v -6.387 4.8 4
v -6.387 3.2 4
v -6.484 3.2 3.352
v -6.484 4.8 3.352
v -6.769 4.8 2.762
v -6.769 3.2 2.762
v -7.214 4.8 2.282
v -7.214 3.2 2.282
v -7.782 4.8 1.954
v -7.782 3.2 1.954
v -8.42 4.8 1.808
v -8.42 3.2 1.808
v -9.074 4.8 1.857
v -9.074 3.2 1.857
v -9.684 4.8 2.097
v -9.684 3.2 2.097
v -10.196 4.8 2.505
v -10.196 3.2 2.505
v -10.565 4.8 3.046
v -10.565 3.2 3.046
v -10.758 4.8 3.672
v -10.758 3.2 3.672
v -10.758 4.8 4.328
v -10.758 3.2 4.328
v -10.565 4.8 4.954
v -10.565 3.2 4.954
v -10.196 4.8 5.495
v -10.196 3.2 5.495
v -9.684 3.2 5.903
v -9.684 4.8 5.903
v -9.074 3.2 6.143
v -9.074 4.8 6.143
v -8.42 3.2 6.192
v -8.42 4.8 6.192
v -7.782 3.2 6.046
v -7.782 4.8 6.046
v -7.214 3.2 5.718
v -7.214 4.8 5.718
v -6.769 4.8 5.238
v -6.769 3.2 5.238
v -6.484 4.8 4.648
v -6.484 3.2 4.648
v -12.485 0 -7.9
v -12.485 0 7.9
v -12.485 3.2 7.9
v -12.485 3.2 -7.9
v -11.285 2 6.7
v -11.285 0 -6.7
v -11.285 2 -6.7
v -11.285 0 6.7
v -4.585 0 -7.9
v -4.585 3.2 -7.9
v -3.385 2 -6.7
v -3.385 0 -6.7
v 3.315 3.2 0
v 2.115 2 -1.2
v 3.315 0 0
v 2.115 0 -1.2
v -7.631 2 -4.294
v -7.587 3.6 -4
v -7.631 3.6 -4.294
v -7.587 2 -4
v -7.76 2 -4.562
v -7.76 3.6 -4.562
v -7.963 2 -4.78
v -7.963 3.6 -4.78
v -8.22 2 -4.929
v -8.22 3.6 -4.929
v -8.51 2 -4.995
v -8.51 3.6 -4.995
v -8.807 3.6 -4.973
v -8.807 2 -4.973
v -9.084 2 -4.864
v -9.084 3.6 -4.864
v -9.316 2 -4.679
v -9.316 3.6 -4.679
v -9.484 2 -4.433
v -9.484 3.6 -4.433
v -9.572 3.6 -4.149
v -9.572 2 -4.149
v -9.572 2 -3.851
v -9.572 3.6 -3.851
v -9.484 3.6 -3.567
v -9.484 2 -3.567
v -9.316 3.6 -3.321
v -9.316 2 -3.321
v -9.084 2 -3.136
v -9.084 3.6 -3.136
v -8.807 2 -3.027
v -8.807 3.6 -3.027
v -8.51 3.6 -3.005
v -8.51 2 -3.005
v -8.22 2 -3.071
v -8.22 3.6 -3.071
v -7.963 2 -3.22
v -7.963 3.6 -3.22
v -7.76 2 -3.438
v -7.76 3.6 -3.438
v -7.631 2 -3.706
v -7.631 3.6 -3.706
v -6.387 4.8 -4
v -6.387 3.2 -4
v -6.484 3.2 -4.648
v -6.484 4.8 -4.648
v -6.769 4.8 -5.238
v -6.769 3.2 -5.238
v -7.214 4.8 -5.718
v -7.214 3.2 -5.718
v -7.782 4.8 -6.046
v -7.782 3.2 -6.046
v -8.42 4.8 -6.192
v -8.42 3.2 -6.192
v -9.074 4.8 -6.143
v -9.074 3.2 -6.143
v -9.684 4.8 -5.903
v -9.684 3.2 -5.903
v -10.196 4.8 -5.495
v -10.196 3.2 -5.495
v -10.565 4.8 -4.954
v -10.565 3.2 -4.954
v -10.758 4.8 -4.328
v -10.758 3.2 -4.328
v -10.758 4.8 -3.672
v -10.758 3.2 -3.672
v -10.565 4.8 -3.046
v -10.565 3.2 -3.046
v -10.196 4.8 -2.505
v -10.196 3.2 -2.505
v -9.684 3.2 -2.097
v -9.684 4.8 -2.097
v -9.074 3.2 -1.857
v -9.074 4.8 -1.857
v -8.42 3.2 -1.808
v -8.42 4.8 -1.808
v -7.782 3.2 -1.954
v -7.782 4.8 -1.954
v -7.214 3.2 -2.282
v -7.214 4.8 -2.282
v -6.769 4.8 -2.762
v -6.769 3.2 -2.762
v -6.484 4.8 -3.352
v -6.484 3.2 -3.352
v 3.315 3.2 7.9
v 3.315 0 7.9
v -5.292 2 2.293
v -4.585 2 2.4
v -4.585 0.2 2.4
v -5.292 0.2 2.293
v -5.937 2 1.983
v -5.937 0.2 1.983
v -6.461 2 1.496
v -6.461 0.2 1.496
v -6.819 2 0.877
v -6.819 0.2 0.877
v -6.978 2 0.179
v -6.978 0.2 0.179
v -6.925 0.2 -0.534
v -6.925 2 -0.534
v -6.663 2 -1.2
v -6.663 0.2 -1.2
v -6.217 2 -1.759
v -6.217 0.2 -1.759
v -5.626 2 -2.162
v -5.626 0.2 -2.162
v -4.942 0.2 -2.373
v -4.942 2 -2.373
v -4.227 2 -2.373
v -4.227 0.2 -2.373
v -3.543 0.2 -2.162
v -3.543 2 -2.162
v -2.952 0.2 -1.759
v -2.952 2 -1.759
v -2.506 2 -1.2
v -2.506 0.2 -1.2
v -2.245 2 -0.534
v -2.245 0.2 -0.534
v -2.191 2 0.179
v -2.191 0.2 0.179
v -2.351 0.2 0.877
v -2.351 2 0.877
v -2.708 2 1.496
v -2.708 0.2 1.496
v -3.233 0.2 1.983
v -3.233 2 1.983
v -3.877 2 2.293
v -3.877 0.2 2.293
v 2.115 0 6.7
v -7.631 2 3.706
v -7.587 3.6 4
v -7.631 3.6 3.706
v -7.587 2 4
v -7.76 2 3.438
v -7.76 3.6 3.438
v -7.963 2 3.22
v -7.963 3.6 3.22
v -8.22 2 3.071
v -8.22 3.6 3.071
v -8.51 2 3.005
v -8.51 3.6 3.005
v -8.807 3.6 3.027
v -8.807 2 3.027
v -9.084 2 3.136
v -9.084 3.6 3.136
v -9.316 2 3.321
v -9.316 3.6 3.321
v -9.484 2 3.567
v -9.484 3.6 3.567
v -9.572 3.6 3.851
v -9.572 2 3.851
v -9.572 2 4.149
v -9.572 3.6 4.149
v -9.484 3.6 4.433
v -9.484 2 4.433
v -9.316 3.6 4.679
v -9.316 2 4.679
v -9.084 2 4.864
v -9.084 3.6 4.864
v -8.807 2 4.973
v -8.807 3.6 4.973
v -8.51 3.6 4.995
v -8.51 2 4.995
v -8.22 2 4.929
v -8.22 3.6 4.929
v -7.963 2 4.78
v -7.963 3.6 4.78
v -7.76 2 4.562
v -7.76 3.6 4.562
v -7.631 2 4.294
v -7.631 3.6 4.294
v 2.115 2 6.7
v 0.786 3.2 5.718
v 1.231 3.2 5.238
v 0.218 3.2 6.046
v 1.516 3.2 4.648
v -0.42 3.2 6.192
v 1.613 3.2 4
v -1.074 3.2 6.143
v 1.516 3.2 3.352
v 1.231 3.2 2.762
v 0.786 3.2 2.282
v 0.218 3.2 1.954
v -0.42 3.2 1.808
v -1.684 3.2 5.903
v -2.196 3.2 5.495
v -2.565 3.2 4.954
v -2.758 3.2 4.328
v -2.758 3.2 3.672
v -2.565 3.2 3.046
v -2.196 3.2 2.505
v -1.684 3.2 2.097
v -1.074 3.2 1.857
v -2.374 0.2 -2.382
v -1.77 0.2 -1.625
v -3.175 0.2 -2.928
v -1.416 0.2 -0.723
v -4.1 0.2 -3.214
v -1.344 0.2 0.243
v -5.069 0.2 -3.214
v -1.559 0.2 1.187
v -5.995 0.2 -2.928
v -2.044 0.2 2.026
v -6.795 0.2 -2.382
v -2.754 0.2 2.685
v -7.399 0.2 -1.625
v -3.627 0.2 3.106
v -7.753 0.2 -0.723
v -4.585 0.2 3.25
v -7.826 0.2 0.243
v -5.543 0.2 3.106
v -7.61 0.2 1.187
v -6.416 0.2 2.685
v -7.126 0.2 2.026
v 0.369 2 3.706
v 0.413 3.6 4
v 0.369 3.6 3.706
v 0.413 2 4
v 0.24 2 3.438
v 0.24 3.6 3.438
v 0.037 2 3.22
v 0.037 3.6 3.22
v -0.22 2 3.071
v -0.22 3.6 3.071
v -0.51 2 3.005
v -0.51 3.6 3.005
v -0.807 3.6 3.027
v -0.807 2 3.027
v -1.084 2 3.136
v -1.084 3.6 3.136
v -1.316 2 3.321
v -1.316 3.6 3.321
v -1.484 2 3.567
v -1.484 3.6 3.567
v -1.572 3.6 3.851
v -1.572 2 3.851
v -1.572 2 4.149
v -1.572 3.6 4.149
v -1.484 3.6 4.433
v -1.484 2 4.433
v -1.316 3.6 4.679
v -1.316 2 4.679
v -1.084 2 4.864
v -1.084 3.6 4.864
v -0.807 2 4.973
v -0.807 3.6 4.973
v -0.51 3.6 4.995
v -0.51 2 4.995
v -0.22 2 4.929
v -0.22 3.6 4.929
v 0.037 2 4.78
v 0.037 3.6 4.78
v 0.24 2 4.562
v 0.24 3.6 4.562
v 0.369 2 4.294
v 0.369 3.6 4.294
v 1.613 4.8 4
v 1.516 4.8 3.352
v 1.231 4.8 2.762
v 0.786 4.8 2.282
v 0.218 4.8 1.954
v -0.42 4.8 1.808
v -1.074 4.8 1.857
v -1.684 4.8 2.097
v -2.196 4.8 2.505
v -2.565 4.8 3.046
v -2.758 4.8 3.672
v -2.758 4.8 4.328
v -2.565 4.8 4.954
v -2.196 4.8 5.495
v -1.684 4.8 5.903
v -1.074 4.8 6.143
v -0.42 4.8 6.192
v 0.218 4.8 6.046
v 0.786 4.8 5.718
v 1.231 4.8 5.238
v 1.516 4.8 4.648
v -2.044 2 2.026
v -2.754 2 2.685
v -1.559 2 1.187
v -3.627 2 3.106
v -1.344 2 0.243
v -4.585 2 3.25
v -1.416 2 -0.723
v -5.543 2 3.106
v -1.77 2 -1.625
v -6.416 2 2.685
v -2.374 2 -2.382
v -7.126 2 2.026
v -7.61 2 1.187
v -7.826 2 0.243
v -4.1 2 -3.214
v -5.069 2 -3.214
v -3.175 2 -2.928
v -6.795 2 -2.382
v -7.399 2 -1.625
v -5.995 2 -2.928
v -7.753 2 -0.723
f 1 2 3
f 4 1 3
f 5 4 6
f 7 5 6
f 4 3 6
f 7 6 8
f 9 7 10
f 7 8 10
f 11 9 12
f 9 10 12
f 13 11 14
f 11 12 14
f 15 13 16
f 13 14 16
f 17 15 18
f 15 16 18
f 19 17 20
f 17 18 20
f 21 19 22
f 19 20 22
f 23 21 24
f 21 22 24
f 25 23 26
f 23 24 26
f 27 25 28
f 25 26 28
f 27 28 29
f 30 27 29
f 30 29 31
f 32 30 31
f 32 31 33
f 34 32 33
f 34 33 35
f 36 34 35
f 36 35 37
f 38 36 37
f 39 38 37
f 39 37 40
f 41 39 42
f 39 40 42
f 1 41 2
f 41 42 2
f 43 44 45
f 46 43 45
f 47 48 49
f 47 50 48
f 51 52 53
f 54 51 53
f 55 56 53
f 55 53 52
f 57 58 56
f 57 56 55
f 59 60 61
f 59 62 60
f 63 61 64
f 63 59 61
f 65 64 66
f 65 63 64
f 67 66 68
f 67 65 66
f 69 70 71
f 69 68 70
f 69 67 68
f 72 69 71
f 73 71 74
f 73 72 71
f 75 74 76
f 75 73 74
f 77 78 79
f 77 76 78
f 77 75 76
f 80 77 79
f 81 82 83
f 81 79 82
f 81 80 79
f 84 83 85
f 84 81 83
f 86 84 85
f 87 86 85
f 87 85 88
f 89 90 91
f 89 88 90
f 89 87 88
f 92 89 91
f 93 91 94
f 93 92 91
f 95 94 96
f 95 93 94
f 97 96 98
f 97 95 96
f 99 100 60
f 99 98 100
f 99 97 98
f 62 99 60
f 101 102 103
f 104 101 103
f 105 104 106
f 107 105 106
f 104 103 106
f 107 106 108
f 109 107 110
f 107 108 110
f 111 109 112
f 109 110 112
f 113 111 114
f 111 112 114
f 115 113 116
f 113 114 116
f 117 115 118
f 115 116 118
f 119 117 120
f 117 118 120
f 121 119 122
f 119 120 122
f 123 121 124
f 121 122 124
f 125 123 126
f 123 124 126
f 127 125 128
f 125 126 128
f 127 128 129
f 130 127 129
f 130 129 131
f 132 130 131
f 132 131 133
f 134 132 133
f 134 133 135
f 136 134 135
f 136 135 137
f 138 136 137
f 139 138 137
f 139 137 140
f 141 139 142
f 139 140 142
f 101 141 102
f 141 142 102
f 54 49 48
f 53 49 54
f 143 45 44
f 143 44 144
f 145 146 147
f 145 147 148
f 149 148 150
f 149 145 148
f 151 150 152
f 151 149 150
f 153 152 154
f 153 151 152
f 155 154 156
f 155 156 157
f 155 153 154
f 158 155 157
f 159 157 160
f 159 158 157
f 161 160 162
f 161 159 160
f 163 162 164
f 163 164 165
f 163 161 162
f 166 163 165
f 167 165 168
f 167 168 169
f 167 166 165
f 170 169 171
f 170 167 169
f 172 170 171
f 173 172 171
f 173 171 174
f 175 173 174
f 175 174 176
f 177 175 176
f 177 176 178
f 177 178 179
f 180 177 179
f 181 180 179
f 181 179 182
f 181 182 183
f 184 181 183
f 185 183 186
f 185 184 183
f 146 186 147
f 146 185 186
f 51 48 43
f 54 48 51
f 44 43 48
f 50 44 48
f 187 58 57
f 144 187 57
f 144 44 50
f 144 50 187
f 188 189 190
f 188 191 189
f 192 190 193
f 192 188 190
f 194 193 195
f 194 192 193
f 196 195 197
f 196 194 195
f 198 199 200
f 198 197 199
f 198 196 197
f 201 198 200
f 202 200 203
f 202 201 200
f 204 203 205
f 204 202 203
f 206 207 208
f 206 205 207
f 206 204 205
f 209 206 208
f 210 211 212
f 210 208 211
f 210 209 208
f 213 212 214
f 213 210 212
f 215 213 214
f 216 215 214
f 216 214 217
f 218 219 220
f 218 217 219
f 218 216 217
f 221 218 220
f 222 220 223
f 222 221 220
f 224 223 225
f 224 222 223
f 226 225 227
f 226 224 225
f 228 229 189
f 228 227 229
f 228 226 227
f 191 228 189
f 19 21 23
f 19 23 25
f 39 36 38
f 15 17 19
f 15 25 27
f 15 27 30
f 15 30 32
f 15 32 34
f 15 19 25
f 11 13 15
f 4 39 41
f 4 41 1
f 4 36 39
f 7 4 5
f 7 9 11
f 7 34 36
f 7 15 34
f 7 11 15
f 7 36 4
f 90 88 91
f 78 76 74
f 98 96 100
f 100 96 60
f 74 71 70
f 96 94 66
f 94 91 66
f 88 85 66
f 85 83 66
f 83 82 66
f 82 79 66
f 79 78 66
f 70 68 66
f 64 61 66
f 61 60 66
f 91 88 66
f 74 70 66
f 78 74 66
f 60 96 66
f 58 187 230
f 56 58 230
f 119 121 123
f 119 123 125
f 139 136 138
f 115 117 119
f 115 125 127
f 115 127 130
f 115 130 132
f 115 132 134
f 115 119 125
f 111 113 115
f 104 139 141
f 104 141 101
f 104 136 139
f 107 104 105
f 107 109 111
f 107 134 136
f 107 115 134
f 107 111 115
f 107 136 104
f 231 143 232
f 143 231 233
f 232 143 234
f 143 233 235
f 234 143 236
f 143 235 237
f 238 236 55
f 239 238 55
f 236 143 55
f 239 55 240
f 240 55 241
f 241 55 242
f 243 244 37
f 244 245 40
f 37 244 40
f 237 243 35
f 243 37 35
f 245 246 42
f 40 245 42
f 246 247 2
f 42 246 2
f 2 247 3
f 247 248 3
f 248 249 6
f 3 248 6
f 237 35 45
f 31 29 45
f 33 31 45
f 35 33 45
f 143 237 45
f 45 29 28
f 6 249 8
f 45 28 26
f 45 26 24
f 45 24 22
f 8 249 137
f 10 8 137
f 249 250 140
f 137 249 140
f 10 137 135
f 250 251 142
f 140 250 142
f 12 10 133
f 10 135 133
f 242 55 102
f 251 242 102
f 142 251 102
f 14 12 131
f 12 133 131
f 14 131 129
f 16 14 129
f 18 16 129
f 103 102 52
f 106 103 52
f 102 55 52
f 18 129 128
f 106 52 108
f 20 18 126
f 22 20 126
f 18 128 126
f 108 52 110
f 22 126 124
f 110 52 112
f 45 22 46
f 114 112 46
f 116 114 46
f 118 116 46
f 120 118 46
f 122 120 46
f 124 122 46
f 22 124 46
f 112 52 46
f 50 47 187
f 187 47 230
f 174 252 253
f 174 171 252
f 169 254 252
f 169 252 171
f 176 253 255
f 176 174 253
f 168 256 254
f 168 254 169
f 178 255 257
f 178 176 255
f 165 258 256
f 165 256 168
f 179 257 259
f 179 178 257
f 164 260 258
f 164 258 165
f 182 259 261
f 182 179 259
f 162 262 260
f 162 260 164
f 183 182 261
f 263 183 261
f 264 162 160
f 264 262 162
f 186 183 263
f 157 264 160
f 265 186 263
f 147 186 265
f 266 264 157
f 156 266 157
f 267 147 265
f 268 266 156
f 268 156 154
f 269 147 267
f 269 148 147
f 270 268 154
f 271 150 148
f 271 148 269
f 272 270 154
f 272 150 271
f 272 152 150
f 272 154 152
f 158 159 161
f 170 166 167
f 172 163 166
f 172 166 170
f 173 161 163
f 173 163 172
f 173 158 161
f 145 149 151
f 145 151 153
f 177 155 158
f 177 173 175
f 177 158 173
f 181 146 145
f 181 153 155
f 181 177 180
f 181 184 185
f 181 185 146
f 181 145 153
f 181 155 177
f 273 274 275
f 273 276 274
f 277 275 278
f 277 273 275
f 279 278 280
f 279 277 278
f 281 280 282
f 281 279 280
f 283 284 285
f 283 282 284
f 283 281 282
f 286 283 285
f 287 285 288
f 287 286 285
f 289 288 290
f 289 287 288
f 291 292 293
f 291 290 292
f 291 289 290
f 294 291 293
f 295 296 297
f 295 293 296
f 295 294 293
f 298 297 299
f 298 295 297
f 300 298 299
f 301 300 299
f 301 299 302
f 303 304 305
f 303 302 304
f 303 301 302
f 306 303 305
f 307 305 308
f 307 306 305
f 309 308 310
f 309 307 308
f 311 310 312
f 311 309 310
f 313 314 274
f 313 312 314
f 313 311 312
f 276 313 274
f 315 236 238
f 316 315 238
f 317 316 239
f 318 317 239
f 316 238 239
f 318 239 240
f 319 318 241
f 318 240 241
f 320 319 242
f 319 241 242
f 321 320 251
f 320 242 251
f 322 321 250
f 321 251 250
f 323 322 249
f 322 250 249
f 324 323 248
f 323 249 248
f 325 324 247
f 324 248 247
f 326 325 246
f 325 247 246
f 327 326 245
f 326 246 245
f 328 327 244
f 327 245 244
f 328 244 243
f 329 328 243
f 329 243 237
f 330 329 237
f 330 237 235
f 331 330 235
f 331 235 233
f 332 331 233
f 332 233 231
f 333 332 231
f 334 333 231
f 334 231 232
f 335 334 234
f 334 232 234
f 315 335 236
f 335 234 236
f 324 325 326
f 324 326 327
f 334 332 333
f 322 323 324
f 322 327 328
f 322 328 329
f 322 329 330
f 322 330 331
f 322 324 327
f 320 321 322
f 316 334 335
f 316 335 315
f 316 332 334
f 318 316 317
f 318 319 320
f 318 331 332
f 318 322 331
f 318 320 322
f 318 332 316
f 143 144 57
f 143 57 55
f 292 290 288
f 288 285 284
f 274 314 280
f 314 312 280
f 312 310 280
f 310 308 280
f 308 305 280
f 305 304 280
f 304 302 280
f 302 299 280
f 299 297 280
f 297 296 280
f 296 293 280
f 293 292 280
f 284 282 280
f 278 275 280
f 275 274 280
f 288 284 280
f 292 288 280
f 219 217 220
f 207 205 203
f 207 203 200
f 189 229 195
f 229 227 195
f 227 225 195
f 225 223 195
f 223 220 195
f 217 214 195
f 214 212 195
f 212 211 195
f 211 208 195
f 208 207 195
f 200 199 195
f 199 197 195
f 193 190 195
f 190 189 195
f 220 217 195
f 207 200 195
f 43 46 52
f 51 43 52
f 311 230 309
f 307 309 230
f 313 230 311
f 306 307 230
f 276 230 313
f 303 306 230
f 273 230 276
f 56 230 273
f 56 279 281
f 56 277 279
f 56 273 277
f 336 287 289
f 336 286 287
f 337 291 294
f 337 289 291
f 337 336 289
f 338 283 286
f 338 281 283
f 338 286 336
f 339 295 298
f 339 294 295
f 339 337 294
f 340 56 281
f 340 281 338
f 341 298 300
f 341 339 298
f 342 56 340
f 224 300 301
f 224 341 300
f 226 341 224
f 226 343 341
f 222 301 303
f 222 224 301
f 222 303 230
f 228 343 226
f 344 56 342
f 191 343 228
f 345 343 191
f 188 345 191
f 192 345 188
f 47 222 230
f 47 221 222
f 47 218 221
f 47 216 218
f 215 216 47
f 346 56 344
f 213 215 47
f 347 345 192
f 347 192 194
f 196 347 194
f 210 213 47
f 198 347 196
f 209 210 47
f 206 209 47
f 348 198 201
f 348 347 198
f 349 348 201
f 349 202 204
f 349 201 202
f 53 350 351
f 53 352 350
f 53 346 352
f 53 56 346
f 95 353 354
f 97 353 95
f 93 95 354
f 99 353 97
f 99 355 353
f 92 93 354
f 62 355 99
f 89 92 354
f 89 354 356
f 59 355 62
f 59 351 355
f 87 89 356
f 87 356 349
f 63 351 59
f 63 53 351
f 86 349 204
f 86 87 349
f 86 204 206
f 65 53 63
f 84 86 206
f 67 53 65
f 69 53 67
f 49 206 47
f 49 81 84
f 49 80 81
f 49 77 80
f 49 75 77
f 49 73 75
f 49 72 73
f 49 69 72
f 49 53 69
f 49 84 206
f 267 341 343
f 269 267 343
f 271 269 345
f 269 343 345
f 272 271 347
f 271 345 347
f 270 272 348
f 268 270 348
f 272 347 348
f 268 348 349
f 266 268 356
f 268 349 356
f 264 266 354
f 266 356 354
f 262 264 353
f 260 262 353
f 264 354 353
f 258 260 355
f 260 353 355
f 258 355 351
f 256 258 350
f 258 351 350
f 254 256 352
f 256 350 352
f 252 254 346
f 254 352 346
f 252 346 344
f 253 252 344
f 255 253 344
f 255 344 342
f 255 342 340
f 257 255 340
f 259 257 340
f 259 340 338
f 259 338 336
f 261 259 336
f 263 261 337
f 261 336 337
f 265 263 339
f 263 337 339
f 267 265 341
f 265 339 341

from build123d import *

# Parameters (mm, degrees)
BASEFRAMESKETCH_W           = 15.8
BASEFRAMESKETCH_H           = 3.2
BASEFRAME_DEPTH             = 7.9
STUDSSKETCH_R               = 2.197938665
STUDS_DEPTH                 = 1.6
MAINSTUDSPATTERN_COUNT      = 2
MAINSTUDSPATTERN_PITCH      = 8
MAINSTUDSPATTERN_COUNT_DIR2 = 2
MAINSTUDSPATTERN_PITCH_DIR2 = 8
MAINBASESHELL_T             = -1.2
UNDERCIRCLESKETCH_R         = 3.25
UNDERCIRCLESKETCH_R_2       = 2.4
UNDERCIRCLEEXTRUDE_DEPTH    = 1.8
CUT_EXTRUDE42_DEPTH         = 16.116827041
SKETCH116_R                 = 2.316021132
CUT_EXTRUDE43_DEPTH         = 5
BOSS_EXTRUDE26_START        = -1.2
BOSS_EXTRUDE26_DEPTH        = 1.2


with BuildPart() as part:
    # BaseFrameSketch → BaseFrame (new, symmetric)
    with BuildSketch(Plane.XY):
        with Locations((-4.584729064, 1.6)):
            Rectangle(BASEFRAMESKETCH_W, BASEFRAMESKETCH_H)
    extrude(amount=BASEFRAME_DEPTH, both=True)

    # StudsSketch → Studs (add)
    with BuildSketch(Plane(origin=(0, 3.2, 0), x_dir=(1, 0, 0), z_dir=(0, 1, 0))):
        with Locations((-8.584729064, 4)):
            Circle(STUDSSKETCH_R)
    studs = extrude(amount=STUDS_DEPTH)

    # MainStudsPattern: Studs 2 × 2
    with Locations(*[(i * MAINSTUDSPATTERN_PITCH, 0, j * MAINSTUDSPATTERN_PITCH_DIR2) for i in range(MAINSTUDSPATTERN_COUNT) for j in range(MAINSTUDSPATTERN_COUNT_DIR2) if (i, j) != (0, 0)]):
        add(studs)

    # MainBaseShell
    mainbaseshell_openings = [part.faces().sort_by_distance(p)[0] for p in [
        (-4.584729064, 0, 0),
    ]]
    offset(amount=MAINBASESHELL_T, openings=mainbaseshell_openings, kind=Kind.INTERSECTION)

    # UnderCircleSketch → UnderCircleExtrude (add)
    with BuildSketch(Plane(origin=(0, 2, 0), x_dir=(-1, 0, 0), z_dir=(0, -1, 0))):
        with Locations(Location((4.584729064, 0, 0), (0, 0, 270))):
            Circle(UNDERCIRCLESKETCH_R)
        with Locations(Location((4.584729064, 0, 0), (0, 0, 270))):
            Circle(UNDERCIRCLESKETCH_R_2, mode=Mode.SUBTRACT)
    extrude(amount=UNDERCIRCLEEXTRUDE_DEPTH)

    # Sketch115 → Cut-Extrude42 (cut, through all)
    with BuildSketch(Plane(origin=(0, 3.2, 0), x_dir=(1, 0, 0), z_dir=(0, 1, 0))):
        Polygon((-4.584729064, 7.9), (3.315270936, 7.9), (3.315270936, 0), align=None)
    extrude(amount=-CUT_EXTRUDE42_DEPTH, mode=Mode.SUBTRACT)

    # Sketch116 → Cut-Extrude43 (cut)
    with BuildSketch(Plane(origin=(0, 3.2, 0), x_dir=(1, 0, 0), z_dir=(0, 1, 0))):
        with Locations((-0.622263627, 3.930816352)):
            Circle(SKETCH116_R)
    extrude(amount=CUT_EXTRUDE43_DEPTH, mode=Mode.SUBTRACT)

    # Sketch117 → Boss-Extrude26 (add)
    with BuildSketch(Plane(origin=(0, 3.2, 0), x_dir=(1, 0, 0), z_dir=(0, 1, 0)).offset(BOSS_EXTRUDE26_START)):
        with BuildLine():
            Line((-1.338604614, 4.65387555), (0.069146486, 3.24612445))
            ThreePointArc((0.069146486, 3.24612445), (-1.290378261, 3.294350803), (-1.338604614, 4.65387555))
        make_face()
    extrude(amount=BOSS_EXTRUDE26_DEPTH)


solid = part.part
